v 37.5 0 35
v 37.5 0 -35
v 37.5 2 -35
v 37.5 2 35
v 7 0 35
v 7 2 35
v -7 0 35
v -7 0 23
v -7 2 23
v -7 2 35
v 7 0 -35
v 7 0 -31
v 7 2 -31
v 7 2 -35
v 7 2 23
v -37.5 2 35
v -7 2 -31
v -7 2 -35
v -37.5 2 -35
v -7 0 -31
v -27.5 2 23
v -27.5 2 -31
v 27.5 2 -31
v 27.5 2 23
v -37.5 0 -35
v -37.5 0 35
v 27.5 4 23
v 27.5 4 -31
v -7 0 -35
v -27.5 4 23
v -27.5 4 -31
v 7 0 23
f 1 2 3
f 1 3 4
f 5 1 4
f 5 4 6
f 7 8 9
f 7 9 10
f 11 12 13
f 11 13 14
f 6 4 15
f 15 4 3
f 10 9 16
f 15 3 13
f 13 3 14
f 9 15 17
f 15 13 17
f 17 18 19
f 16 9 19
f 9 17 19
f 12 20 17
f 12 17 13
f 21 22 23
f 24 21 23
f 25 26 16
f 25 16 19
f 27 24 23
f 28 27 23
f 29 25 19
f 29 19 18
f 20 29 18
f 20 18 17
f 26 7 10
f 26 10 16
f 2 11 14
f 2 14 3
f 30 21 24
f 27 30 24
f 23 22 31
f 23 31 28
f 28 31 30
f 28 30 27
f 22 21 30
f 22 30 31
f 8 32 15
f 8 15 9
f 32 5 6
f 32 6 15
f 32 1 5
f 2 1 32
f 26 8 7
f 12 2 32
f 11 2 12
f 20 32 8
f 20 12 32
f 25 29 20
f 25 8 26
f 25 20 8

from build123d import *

# Parameters (mm, degrees)
BOSS_EXTRUDE1_DEPTH = 2
SKETCH2_W           = 55
SKETCH2_H           = 54
BOSS_EXTRUDE2_DEPTH = 2


with BuildPart() as part:
    # Sketch1 → Boss-Extrude1 (new body)
    with BuildSketch(Plane(origin=(0, 0, 0), x_dir=(1, 0, 0), z_dir=(0, 1, 0))):
        Polygon((7, 35), (37.5, 35), (37.5, -35), (7, -35), (7, -23), (-7, -23), (-7, -35), (-37.5, -35), (-37.5, 35), (-7, 35), (-7, 31), (7, 31), align=None)
    extrude(amount=BOSS_EXTRUDE1_DEPTH)


with BuildPart() as body_2:
    # Sketch2 → Boss-Extrude2 (new body)
    with BuildSketch(Plane(origin=(0, 2, 0), x_dir=(1, 0, 0), z_dir=(0, 1, 0))):
        with Locations((0, 4)):
            Rectangle(SKETCH2_W, SKETCH2_H)
    extrude(amount=BOSS_EXTRUDE2_DEPTH)


solid = Compound([part.part, body_2.part])
